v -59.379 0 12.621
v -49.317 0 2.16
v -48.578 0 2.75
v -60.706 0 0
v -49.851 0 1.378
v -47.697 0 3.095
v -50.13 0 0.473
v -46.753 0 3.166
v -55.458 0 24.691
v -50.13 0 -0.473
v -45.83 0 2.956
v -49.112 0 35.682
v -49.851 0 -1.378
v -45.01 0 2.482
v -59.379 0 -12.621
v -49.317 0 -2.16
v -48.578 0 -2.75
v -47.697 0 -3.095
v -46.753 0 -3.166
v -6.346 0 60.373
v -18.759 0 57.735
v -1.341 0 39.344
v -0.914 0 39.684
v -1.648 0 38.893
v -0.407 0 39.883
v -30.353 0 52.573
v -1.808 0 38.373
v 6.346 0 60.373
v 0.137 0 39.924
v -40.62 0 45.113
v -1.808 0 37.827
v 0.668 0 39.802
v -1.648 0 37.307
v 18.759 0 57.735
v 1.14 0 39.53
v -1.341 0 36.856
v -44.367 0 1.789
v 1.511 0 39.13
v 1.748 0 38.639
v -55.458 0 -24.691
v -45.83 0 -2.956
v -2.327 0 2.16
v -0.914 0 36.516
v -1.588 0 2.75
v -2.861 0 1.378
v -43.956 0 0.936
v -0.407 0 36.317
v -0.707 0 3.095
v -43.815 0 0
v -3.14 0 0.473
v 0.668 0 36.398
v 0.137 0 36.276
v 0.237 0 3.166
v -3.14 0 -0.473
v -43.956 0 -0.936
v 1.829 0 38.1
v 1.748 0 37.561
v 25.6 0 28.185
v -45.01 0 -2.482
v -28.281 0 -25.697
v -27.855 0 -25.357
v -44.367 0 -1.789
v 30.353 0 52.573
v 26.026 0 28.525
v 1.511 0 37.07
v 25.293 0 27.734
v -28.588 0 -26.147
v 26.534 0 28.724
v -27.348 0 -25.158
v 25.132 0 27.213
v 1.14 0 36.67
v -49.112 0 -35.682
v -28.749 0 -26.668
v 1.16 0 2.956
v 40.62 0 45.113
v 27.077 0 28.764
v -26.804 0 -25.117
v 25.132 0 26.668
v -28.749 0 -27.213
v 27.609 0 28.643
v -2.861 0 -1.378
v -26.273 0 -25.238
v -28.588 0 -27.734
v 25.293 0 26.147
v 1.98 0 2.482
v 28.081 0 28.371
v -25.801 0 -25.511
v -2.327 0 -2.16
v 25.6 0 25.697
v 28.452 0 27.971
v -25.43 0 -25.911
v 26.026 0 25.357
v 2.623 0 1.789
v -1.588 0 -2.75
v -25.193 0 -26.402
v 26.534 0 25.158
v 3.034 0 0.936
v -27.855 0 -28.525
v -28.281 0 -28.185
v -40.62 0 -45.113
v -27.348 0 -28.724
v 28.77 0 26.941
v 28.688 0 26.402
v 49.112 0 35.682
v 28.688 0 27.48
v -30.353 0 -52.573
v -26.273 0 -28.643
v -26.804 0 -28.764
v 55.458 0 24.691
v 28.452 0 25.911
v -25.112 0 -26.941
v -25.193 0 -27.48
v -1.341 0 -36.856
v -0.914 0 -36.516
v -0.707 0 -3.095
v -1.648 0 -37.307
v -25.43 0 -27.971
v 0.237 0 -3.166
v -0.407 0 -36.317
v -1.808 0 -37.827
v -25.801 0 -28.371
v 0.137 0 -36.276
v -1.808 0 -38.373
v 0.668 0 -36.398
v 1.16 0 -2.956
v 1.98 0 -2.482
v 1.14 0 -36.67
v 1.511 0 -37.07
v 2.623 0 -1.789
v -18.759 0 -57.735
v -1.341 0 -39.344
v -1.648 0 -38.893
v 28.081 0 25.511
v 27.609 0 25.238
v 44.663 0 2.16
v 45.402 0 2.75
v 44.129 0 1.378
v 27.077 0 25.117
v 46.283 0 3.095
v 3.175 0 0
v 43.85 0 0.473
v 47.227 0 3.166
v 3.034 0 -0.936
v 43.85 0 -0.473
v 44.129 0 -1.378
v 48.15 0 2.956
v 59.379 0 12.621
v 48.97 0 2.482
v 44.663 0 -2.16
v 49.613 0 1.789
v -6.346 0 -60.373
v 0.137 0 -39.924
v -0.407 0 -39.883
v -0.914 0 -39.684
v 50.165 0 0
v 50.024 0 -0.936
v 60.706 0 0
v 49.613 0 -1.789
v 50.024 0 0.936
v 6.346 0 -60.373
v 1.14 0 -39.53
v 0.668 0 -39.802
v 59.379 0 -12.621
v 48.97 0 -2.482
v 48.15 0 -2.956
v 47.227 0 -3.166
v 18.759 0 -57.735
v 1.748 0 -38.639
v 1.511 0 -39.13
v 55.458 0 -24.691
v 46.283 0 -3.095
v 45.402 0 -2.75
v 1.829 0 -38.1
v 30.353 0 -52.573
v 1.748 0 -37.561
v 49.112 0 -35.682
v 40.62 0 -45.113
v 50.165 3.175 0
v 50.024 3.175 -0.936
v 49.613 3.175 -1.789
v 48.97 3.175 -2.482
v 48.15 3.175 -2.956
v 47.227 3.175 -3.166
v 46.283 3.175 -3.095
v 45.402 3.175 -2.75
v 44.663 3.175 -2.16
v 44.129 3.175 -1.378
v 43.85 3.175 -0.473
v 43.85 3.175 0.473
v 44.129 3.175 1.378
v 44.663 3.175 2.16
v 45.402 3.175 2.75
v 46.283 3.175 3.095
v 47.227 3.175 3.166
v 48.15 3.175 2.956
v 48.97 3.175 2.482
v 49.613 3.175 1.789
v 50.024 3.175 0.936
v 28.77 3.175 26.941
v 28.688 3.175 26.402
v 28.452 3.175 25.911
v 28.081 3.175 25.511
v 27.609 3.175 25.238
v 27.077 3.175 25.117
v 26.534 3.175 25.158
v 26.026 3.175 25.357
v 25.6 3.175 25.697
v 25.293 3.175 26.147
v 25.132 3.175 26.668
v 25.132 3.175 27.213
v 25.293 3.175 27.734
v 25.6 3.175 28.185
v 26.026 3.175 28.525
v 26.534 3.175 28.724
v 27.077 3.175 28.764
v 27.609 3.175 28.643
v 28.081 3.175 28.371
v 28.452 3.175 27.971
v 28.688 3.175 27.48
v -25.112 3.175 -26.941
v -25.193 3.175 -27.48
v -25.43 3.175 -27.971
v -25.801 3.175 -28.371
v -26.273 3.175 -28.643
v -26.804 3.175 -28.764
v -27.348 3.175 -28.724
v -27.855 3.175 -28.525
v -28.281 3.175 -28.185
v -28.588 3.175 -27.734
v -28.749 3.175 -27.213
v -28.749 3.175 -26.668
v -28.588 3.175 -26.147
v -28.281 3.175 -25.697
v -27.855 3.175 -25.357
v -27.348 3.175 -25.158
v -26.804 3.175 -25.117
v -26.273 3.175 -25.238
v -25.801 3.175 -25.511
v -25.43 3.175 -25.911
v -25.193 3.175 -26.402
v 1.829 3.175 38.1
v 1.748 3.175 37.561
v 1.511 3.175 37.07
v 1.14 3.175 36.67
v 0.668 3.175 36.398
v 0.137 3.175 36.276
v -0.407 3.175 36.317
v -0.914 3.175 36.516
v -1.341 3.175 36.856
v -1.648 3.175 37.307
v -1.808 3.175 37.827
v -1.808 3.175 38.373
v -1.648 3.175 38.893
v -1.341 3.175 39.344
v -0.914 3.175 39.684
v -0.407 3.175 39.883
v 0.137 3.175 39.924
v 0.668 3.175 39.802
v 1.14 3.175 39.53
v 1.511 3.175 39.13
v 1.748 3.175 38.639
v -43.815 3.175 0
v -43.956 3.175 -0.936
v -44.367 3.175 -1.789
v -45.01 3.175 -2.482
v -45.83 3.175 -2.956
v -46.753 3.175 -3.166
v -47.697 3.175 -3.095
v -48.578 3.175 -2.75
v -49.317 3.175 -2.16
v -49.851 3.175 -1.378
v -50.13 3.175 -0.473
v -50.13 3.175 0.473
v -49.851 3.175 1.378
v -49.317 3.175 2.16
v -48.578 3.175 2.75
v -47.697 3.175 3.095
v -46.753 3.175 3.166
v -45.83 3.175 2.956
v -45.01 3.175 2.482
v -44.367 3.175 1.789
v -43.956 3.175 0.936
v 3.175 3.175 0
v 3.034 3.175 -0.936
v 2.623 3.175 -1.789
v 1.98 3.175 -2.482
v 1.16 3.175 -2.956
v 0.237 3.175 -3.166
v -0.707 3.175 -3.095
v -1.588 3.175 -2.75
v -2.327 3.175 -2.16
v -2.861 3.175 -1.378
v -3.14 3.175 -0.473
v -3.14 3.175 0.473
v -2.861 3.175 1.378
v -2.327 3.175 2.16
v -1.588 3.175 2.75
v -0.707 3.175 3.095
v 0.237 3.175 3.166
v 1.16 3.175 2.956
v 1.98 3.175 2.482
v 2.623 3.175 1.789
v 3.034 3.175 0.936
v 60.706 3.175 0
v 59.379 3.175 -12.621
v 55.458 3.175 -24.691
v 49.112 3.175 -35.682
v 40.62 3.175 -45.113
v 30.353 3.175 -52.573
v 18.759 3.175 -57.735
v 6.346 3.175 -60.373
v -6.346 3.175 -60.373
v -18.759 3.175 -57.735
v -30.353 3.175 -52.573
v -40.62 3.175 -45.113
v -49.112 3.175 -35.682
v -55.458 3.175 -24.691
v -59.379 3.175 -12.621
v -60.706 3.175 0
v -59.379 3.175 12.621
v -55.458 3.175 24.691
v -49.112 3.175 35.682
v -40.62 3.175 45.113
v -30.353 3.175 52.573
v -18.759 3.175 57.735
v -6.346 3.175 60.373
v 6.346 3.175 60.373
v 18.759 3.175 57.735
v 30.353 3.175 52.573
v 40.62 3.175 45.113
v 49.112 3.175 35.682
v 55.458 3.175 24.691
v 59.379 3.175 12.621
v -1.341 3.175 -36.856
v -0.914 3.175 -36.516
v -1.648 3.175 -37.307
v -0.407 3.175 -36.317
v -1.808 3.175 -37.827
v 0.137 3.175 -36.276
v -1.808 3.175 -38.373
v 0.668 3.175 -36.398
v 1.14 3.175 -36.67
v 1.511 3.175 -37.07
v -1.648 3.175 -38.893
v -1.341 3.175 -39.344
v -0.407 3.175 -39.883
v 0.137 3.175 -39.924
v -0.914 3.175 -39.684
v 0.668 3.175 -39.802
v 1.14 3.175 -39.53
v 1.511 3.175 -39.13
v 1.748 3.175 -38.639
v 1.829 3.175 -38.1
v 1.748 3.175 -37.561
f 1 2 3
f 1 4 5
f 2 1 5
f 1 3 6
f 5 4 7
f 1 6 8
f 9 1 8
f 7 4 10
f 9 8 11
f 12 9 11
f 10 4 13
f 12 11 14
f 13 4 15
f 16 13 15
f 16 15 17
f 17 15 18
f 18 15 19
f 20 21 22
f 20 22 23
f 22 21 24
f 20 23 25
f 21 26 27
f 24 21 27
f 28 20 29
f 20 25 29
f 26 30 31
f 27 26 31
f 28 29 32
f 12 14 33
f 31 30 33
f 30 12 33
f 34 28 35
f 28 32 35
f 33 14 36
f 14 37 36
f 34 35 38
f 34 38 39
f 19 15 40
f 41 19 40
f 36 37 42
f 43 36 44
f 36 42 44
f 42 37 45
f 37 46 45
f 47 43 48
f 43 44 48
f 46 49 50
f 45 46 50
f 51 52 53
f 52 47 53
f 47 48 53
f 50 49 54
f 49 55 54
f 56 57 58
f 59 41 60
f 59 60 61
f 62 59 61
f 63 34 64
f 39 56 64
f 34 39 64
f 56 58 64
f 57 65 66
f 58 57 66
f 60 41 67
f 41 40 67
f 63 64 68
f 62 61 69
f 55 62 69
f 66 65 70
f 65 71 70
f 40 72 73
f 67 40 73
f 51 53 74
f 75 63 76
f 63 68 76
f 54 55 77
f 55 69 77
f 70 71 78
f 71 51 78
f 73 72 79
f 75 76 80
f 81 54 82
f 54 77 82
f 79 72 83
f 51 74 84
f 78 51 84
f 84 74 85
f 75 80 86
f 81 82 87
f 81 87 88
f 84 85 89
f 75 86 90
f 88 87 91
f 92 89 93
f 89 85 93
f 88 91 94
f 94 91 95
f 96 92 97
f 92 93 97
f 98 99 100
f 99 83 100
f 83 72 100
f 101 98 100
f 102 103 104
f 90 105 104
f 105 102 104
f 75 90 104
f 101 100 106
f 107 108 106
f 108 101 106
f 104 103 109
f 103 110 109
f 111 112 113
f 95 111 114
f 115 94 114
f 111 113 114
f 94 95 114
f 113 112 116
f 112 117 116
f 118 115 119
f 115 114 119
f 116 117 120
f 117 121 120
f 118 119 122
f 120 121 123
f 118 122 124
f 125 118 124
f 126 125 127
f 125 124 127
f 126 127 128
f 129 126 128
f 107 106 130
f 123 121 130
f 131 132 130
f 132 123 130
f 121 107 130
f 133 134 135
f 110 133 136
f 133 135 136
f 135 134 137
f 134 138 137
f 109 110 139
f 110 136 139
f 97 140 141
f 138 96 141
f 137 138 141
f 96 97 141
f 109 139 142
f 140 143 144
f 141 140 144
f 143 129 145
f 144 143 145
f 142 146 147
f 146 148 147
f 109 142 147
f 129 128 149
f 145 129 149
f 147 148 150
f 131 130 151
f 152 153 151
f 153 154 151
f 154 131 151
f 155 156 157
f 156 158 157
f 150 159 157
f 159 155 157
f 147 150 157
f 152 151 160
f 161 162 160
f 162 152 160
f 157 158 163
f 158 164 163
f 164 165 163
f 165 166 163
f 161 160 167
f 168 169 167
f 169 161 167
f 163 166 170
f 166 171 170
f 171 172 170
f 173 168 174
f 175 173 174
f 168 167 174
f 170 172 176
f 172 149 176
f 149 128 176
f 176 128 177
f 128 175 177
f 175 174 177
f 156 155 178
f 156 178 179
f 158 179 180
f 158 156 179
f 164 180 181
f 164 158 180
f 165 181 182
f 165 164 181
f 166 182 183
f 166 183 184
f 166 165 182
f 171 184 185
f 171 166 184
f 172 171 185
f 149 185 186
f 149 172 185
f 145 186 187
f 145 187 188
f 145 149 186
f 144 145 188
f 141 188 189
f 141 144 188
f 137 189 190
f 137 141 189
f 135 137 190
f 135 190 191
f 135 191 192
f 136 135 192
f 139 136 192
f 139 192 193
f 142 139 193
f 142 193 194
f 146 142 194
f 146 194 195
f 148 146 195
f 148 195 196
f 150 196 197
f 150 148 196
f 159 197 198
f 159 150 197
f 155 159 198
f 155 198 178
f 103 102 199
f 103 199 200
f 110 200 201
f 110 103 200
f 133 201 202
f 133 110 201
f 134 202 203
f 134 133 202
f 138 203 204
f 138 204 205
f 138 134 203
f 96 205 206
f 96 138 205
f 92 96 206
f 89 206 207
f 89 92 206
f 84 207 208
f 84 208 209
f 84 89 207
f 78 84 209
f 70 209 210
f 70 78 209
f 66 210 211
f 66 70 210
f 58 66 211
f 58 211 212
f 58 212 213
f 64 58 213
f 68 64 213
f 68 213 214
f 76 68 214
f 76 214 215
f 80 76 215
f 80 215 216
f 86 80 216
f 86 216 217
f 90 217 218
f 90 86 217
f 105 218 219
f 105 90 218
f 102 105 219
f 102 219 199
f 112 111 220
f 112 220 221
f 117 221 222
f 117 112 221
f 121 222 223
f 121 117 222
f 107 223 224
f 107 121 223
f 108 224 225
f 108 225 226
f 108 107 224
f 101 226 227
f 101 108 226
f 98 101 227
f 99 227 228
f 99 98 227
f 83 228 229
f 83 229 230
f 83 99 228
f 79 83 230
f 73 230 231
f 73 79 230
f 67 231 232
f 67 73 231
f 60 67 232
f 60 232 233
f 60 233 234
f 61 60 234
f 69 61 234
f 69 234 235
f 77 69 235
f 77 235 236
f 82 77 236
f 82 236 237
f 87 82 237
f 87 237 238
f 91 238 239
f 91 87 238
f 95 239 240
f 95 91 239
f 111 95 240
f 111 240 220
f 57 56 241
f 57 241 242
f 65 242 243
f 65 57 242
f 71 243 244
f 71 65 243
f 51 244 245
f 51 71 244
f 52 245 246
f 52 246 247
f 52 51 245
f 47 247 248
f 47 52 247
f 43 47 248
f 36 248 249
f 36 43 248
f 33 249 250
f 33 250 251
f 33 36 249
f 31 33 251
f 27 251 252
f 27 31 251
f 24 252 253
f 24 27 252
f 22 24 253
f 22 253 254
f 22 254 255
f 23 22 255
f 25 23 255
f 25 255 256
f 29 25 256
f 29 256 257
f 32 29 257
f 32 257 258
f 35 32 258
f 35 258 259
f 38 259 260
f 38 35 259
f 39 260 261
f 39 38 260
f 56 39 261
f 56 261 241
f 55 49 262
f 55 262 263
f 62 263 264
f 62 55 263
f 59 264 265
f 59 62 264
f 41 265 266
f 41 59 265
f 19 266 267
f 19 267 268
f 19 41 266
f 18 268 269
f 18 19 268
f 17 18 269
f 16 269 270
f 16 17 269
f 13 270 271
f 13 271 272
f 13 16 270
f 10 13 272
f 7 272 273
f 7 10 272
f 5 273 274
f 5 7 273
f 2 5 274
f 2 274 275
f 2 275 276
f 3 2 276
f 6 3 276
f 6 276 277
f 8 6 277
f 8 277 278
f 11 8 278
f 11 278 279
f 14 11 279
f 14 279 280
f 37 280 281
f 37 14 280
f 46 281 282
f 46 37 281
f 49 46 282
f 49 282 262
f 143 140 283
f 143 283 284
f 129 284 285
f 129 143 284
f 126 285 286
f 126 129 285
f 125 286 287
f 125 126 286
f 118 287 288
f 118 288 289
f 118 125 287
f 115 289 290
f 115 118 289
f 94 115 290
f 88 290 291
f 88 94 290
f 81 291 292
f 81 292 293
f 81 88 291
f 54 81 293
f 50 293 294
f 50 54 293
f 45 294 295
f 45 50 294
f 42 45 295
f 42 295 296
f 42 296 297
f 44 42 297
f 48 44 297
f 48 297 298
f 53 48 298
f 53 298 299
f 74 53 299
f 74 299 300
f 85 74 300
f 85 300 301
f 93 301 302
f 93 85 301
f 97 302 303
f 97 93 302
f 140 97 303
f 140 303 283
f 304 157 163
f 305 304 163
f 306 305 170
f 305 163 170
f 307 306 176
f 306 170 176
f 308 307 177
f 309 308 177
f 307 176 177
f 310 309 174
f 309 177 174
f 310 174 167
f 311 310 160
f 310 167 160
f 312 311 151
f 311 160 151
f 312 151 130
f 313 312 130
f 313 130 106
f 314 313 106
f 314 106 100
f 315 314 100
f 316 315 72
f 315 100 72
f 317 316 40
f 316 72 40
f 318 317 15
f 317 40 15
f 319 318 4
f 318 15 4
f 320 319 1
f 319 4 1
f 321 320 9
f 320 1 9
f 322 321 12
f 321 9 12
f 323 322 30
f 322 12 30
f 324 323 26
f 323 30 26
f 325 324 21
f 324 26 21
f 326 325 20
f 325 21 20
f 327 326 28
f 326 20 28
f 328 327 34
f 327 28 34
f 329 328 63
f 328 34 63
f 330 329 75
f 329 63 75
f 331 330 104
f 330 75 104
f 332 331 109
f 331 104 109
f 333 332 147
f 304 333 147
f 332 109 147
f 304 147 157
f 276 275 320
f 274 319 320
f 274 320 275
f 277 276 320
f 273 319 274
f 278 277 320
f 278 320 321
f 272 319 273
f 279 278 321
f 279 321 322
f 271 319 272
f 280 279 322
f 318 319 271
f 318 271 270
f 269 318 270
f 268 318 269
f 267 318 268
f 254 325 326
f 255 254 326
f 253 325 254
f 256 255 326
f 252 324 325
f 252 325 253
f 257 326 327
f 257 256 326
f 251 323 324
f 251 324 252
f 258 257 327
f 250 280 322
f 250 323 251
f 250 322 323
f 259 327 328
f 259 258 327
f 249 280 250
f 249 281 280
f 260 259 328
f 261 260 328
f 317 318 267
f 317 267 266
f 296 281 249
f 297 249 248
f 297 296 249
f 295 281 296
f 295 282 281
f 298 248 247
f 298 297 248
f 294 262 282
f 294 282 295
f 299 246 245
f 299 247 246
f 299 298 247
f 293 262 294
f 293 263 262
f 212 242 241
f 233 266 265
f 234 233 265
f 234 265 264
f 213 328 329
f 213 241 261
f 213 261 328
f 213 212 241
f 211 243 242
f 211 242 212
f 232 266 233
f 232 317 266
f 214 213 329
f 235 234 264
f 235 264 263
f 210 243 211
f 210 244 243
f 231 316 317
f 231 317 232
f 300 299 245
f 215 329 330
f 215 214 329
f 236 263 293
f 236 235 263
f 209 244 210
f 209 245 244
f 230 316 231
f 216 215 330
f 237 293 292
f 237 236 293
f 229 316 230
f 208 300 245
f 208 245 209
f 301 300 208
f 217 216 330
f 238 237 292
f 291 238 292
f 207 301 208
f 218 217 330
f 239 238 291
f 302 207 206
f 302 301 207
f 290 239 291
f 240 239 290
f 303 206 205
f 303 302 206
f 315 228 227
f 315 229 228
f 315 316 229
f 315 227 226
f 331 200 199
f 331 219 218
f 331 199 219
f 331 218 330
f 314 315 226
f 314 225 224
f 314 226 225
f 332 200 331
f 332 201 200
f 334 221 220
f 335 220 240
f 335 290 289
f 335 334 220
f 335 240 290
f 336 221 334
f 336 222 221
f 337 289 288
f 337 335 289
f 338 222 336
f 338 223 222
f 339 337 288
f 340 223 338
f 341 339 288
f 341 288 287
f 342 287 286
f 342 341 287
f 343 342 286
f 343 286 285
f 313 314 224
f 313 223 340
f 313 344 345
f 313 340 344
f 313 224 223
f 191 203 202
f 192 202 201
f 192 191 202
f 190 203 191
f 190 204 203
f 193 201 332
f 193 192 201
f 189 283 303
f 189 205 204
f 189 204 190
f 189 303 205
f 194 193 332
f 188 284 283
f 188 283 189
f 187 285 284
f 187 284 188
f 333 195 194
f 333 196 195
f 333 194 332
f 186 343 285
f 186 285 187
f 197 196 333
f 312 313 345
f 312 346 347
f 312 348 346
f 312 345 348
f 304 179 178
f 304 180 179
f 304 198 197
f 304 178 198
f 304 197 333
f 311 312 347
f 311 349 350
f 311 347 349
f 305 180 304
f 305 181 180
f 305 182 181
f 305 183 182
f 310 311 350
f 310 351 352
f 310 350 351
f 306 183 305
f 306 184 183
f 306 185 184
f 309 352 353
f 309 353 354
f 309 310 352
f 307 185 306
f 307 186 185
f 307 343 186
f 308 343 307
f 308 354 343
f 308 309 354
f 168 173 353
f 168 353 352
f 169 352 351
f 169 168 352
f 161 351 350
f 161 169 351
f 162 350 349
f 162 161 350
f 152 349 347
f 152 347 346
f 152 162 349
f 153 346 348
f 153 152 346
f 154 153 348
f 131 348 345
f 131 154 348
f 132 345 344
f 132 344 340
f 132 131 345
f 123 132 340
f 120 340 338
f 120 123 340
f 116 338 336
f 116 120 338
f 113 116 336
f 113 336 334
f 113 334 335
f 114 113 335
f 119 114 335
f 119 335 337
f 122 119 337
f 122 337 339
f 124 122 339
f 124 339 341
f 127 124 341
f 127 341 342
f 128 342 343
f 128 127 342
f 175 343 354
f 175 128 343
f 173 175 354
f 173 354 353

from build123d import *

# Parameters (mm, degrees)
SKETCH2_R           = 60.706
SKETCH2_R_2         = 3.175
SKETCH2_R_3         = 1.8288
BOSS_EXTRUDE1_DEPTH = 3.175


with BuildPart() as part:
    # Sketch2 → Boss-Extrude1 (new body)
    with BuildSketch(Plane(origin=(0, 0, 0), x_dir=(1, 0, 0), z_dir=(0, 1, 0))):
        Circle(SKETCH2_R)
        with Locations((-46.99, 0)):
            Circle(SKETCH2_R_2, mode=Mode.SUBTRACT)
        with Locations((46.99, 0)):
            Circle(SKETCH2_R_2, mode=Mode.SUBTRACT)
        Circle(SKETCH2_R_2, mode=Mode.SUBTRACT)
        with Locations((0, 38.1)):
            Circle(SKETCH2_R_3, mode=Mode.SUBTRACT)
        with Locations((0, -38.1)):
            Circle(SKETCH2_R_3, mode=Mode.SUBTRACT)
        with Locations((-26.940768363, 26.940768363)):
            Circle(SKETCH2_R_3, mode=Mode.SUBTRACT)
        with Locations((26.940768363, -26.940768363)):
            Circle(SKETCH2_R_3, mode=Mode.SUBTRACT)
    extrude(amount=BOSS_EXTRUDE1_DEPTH)


solid = part.part
